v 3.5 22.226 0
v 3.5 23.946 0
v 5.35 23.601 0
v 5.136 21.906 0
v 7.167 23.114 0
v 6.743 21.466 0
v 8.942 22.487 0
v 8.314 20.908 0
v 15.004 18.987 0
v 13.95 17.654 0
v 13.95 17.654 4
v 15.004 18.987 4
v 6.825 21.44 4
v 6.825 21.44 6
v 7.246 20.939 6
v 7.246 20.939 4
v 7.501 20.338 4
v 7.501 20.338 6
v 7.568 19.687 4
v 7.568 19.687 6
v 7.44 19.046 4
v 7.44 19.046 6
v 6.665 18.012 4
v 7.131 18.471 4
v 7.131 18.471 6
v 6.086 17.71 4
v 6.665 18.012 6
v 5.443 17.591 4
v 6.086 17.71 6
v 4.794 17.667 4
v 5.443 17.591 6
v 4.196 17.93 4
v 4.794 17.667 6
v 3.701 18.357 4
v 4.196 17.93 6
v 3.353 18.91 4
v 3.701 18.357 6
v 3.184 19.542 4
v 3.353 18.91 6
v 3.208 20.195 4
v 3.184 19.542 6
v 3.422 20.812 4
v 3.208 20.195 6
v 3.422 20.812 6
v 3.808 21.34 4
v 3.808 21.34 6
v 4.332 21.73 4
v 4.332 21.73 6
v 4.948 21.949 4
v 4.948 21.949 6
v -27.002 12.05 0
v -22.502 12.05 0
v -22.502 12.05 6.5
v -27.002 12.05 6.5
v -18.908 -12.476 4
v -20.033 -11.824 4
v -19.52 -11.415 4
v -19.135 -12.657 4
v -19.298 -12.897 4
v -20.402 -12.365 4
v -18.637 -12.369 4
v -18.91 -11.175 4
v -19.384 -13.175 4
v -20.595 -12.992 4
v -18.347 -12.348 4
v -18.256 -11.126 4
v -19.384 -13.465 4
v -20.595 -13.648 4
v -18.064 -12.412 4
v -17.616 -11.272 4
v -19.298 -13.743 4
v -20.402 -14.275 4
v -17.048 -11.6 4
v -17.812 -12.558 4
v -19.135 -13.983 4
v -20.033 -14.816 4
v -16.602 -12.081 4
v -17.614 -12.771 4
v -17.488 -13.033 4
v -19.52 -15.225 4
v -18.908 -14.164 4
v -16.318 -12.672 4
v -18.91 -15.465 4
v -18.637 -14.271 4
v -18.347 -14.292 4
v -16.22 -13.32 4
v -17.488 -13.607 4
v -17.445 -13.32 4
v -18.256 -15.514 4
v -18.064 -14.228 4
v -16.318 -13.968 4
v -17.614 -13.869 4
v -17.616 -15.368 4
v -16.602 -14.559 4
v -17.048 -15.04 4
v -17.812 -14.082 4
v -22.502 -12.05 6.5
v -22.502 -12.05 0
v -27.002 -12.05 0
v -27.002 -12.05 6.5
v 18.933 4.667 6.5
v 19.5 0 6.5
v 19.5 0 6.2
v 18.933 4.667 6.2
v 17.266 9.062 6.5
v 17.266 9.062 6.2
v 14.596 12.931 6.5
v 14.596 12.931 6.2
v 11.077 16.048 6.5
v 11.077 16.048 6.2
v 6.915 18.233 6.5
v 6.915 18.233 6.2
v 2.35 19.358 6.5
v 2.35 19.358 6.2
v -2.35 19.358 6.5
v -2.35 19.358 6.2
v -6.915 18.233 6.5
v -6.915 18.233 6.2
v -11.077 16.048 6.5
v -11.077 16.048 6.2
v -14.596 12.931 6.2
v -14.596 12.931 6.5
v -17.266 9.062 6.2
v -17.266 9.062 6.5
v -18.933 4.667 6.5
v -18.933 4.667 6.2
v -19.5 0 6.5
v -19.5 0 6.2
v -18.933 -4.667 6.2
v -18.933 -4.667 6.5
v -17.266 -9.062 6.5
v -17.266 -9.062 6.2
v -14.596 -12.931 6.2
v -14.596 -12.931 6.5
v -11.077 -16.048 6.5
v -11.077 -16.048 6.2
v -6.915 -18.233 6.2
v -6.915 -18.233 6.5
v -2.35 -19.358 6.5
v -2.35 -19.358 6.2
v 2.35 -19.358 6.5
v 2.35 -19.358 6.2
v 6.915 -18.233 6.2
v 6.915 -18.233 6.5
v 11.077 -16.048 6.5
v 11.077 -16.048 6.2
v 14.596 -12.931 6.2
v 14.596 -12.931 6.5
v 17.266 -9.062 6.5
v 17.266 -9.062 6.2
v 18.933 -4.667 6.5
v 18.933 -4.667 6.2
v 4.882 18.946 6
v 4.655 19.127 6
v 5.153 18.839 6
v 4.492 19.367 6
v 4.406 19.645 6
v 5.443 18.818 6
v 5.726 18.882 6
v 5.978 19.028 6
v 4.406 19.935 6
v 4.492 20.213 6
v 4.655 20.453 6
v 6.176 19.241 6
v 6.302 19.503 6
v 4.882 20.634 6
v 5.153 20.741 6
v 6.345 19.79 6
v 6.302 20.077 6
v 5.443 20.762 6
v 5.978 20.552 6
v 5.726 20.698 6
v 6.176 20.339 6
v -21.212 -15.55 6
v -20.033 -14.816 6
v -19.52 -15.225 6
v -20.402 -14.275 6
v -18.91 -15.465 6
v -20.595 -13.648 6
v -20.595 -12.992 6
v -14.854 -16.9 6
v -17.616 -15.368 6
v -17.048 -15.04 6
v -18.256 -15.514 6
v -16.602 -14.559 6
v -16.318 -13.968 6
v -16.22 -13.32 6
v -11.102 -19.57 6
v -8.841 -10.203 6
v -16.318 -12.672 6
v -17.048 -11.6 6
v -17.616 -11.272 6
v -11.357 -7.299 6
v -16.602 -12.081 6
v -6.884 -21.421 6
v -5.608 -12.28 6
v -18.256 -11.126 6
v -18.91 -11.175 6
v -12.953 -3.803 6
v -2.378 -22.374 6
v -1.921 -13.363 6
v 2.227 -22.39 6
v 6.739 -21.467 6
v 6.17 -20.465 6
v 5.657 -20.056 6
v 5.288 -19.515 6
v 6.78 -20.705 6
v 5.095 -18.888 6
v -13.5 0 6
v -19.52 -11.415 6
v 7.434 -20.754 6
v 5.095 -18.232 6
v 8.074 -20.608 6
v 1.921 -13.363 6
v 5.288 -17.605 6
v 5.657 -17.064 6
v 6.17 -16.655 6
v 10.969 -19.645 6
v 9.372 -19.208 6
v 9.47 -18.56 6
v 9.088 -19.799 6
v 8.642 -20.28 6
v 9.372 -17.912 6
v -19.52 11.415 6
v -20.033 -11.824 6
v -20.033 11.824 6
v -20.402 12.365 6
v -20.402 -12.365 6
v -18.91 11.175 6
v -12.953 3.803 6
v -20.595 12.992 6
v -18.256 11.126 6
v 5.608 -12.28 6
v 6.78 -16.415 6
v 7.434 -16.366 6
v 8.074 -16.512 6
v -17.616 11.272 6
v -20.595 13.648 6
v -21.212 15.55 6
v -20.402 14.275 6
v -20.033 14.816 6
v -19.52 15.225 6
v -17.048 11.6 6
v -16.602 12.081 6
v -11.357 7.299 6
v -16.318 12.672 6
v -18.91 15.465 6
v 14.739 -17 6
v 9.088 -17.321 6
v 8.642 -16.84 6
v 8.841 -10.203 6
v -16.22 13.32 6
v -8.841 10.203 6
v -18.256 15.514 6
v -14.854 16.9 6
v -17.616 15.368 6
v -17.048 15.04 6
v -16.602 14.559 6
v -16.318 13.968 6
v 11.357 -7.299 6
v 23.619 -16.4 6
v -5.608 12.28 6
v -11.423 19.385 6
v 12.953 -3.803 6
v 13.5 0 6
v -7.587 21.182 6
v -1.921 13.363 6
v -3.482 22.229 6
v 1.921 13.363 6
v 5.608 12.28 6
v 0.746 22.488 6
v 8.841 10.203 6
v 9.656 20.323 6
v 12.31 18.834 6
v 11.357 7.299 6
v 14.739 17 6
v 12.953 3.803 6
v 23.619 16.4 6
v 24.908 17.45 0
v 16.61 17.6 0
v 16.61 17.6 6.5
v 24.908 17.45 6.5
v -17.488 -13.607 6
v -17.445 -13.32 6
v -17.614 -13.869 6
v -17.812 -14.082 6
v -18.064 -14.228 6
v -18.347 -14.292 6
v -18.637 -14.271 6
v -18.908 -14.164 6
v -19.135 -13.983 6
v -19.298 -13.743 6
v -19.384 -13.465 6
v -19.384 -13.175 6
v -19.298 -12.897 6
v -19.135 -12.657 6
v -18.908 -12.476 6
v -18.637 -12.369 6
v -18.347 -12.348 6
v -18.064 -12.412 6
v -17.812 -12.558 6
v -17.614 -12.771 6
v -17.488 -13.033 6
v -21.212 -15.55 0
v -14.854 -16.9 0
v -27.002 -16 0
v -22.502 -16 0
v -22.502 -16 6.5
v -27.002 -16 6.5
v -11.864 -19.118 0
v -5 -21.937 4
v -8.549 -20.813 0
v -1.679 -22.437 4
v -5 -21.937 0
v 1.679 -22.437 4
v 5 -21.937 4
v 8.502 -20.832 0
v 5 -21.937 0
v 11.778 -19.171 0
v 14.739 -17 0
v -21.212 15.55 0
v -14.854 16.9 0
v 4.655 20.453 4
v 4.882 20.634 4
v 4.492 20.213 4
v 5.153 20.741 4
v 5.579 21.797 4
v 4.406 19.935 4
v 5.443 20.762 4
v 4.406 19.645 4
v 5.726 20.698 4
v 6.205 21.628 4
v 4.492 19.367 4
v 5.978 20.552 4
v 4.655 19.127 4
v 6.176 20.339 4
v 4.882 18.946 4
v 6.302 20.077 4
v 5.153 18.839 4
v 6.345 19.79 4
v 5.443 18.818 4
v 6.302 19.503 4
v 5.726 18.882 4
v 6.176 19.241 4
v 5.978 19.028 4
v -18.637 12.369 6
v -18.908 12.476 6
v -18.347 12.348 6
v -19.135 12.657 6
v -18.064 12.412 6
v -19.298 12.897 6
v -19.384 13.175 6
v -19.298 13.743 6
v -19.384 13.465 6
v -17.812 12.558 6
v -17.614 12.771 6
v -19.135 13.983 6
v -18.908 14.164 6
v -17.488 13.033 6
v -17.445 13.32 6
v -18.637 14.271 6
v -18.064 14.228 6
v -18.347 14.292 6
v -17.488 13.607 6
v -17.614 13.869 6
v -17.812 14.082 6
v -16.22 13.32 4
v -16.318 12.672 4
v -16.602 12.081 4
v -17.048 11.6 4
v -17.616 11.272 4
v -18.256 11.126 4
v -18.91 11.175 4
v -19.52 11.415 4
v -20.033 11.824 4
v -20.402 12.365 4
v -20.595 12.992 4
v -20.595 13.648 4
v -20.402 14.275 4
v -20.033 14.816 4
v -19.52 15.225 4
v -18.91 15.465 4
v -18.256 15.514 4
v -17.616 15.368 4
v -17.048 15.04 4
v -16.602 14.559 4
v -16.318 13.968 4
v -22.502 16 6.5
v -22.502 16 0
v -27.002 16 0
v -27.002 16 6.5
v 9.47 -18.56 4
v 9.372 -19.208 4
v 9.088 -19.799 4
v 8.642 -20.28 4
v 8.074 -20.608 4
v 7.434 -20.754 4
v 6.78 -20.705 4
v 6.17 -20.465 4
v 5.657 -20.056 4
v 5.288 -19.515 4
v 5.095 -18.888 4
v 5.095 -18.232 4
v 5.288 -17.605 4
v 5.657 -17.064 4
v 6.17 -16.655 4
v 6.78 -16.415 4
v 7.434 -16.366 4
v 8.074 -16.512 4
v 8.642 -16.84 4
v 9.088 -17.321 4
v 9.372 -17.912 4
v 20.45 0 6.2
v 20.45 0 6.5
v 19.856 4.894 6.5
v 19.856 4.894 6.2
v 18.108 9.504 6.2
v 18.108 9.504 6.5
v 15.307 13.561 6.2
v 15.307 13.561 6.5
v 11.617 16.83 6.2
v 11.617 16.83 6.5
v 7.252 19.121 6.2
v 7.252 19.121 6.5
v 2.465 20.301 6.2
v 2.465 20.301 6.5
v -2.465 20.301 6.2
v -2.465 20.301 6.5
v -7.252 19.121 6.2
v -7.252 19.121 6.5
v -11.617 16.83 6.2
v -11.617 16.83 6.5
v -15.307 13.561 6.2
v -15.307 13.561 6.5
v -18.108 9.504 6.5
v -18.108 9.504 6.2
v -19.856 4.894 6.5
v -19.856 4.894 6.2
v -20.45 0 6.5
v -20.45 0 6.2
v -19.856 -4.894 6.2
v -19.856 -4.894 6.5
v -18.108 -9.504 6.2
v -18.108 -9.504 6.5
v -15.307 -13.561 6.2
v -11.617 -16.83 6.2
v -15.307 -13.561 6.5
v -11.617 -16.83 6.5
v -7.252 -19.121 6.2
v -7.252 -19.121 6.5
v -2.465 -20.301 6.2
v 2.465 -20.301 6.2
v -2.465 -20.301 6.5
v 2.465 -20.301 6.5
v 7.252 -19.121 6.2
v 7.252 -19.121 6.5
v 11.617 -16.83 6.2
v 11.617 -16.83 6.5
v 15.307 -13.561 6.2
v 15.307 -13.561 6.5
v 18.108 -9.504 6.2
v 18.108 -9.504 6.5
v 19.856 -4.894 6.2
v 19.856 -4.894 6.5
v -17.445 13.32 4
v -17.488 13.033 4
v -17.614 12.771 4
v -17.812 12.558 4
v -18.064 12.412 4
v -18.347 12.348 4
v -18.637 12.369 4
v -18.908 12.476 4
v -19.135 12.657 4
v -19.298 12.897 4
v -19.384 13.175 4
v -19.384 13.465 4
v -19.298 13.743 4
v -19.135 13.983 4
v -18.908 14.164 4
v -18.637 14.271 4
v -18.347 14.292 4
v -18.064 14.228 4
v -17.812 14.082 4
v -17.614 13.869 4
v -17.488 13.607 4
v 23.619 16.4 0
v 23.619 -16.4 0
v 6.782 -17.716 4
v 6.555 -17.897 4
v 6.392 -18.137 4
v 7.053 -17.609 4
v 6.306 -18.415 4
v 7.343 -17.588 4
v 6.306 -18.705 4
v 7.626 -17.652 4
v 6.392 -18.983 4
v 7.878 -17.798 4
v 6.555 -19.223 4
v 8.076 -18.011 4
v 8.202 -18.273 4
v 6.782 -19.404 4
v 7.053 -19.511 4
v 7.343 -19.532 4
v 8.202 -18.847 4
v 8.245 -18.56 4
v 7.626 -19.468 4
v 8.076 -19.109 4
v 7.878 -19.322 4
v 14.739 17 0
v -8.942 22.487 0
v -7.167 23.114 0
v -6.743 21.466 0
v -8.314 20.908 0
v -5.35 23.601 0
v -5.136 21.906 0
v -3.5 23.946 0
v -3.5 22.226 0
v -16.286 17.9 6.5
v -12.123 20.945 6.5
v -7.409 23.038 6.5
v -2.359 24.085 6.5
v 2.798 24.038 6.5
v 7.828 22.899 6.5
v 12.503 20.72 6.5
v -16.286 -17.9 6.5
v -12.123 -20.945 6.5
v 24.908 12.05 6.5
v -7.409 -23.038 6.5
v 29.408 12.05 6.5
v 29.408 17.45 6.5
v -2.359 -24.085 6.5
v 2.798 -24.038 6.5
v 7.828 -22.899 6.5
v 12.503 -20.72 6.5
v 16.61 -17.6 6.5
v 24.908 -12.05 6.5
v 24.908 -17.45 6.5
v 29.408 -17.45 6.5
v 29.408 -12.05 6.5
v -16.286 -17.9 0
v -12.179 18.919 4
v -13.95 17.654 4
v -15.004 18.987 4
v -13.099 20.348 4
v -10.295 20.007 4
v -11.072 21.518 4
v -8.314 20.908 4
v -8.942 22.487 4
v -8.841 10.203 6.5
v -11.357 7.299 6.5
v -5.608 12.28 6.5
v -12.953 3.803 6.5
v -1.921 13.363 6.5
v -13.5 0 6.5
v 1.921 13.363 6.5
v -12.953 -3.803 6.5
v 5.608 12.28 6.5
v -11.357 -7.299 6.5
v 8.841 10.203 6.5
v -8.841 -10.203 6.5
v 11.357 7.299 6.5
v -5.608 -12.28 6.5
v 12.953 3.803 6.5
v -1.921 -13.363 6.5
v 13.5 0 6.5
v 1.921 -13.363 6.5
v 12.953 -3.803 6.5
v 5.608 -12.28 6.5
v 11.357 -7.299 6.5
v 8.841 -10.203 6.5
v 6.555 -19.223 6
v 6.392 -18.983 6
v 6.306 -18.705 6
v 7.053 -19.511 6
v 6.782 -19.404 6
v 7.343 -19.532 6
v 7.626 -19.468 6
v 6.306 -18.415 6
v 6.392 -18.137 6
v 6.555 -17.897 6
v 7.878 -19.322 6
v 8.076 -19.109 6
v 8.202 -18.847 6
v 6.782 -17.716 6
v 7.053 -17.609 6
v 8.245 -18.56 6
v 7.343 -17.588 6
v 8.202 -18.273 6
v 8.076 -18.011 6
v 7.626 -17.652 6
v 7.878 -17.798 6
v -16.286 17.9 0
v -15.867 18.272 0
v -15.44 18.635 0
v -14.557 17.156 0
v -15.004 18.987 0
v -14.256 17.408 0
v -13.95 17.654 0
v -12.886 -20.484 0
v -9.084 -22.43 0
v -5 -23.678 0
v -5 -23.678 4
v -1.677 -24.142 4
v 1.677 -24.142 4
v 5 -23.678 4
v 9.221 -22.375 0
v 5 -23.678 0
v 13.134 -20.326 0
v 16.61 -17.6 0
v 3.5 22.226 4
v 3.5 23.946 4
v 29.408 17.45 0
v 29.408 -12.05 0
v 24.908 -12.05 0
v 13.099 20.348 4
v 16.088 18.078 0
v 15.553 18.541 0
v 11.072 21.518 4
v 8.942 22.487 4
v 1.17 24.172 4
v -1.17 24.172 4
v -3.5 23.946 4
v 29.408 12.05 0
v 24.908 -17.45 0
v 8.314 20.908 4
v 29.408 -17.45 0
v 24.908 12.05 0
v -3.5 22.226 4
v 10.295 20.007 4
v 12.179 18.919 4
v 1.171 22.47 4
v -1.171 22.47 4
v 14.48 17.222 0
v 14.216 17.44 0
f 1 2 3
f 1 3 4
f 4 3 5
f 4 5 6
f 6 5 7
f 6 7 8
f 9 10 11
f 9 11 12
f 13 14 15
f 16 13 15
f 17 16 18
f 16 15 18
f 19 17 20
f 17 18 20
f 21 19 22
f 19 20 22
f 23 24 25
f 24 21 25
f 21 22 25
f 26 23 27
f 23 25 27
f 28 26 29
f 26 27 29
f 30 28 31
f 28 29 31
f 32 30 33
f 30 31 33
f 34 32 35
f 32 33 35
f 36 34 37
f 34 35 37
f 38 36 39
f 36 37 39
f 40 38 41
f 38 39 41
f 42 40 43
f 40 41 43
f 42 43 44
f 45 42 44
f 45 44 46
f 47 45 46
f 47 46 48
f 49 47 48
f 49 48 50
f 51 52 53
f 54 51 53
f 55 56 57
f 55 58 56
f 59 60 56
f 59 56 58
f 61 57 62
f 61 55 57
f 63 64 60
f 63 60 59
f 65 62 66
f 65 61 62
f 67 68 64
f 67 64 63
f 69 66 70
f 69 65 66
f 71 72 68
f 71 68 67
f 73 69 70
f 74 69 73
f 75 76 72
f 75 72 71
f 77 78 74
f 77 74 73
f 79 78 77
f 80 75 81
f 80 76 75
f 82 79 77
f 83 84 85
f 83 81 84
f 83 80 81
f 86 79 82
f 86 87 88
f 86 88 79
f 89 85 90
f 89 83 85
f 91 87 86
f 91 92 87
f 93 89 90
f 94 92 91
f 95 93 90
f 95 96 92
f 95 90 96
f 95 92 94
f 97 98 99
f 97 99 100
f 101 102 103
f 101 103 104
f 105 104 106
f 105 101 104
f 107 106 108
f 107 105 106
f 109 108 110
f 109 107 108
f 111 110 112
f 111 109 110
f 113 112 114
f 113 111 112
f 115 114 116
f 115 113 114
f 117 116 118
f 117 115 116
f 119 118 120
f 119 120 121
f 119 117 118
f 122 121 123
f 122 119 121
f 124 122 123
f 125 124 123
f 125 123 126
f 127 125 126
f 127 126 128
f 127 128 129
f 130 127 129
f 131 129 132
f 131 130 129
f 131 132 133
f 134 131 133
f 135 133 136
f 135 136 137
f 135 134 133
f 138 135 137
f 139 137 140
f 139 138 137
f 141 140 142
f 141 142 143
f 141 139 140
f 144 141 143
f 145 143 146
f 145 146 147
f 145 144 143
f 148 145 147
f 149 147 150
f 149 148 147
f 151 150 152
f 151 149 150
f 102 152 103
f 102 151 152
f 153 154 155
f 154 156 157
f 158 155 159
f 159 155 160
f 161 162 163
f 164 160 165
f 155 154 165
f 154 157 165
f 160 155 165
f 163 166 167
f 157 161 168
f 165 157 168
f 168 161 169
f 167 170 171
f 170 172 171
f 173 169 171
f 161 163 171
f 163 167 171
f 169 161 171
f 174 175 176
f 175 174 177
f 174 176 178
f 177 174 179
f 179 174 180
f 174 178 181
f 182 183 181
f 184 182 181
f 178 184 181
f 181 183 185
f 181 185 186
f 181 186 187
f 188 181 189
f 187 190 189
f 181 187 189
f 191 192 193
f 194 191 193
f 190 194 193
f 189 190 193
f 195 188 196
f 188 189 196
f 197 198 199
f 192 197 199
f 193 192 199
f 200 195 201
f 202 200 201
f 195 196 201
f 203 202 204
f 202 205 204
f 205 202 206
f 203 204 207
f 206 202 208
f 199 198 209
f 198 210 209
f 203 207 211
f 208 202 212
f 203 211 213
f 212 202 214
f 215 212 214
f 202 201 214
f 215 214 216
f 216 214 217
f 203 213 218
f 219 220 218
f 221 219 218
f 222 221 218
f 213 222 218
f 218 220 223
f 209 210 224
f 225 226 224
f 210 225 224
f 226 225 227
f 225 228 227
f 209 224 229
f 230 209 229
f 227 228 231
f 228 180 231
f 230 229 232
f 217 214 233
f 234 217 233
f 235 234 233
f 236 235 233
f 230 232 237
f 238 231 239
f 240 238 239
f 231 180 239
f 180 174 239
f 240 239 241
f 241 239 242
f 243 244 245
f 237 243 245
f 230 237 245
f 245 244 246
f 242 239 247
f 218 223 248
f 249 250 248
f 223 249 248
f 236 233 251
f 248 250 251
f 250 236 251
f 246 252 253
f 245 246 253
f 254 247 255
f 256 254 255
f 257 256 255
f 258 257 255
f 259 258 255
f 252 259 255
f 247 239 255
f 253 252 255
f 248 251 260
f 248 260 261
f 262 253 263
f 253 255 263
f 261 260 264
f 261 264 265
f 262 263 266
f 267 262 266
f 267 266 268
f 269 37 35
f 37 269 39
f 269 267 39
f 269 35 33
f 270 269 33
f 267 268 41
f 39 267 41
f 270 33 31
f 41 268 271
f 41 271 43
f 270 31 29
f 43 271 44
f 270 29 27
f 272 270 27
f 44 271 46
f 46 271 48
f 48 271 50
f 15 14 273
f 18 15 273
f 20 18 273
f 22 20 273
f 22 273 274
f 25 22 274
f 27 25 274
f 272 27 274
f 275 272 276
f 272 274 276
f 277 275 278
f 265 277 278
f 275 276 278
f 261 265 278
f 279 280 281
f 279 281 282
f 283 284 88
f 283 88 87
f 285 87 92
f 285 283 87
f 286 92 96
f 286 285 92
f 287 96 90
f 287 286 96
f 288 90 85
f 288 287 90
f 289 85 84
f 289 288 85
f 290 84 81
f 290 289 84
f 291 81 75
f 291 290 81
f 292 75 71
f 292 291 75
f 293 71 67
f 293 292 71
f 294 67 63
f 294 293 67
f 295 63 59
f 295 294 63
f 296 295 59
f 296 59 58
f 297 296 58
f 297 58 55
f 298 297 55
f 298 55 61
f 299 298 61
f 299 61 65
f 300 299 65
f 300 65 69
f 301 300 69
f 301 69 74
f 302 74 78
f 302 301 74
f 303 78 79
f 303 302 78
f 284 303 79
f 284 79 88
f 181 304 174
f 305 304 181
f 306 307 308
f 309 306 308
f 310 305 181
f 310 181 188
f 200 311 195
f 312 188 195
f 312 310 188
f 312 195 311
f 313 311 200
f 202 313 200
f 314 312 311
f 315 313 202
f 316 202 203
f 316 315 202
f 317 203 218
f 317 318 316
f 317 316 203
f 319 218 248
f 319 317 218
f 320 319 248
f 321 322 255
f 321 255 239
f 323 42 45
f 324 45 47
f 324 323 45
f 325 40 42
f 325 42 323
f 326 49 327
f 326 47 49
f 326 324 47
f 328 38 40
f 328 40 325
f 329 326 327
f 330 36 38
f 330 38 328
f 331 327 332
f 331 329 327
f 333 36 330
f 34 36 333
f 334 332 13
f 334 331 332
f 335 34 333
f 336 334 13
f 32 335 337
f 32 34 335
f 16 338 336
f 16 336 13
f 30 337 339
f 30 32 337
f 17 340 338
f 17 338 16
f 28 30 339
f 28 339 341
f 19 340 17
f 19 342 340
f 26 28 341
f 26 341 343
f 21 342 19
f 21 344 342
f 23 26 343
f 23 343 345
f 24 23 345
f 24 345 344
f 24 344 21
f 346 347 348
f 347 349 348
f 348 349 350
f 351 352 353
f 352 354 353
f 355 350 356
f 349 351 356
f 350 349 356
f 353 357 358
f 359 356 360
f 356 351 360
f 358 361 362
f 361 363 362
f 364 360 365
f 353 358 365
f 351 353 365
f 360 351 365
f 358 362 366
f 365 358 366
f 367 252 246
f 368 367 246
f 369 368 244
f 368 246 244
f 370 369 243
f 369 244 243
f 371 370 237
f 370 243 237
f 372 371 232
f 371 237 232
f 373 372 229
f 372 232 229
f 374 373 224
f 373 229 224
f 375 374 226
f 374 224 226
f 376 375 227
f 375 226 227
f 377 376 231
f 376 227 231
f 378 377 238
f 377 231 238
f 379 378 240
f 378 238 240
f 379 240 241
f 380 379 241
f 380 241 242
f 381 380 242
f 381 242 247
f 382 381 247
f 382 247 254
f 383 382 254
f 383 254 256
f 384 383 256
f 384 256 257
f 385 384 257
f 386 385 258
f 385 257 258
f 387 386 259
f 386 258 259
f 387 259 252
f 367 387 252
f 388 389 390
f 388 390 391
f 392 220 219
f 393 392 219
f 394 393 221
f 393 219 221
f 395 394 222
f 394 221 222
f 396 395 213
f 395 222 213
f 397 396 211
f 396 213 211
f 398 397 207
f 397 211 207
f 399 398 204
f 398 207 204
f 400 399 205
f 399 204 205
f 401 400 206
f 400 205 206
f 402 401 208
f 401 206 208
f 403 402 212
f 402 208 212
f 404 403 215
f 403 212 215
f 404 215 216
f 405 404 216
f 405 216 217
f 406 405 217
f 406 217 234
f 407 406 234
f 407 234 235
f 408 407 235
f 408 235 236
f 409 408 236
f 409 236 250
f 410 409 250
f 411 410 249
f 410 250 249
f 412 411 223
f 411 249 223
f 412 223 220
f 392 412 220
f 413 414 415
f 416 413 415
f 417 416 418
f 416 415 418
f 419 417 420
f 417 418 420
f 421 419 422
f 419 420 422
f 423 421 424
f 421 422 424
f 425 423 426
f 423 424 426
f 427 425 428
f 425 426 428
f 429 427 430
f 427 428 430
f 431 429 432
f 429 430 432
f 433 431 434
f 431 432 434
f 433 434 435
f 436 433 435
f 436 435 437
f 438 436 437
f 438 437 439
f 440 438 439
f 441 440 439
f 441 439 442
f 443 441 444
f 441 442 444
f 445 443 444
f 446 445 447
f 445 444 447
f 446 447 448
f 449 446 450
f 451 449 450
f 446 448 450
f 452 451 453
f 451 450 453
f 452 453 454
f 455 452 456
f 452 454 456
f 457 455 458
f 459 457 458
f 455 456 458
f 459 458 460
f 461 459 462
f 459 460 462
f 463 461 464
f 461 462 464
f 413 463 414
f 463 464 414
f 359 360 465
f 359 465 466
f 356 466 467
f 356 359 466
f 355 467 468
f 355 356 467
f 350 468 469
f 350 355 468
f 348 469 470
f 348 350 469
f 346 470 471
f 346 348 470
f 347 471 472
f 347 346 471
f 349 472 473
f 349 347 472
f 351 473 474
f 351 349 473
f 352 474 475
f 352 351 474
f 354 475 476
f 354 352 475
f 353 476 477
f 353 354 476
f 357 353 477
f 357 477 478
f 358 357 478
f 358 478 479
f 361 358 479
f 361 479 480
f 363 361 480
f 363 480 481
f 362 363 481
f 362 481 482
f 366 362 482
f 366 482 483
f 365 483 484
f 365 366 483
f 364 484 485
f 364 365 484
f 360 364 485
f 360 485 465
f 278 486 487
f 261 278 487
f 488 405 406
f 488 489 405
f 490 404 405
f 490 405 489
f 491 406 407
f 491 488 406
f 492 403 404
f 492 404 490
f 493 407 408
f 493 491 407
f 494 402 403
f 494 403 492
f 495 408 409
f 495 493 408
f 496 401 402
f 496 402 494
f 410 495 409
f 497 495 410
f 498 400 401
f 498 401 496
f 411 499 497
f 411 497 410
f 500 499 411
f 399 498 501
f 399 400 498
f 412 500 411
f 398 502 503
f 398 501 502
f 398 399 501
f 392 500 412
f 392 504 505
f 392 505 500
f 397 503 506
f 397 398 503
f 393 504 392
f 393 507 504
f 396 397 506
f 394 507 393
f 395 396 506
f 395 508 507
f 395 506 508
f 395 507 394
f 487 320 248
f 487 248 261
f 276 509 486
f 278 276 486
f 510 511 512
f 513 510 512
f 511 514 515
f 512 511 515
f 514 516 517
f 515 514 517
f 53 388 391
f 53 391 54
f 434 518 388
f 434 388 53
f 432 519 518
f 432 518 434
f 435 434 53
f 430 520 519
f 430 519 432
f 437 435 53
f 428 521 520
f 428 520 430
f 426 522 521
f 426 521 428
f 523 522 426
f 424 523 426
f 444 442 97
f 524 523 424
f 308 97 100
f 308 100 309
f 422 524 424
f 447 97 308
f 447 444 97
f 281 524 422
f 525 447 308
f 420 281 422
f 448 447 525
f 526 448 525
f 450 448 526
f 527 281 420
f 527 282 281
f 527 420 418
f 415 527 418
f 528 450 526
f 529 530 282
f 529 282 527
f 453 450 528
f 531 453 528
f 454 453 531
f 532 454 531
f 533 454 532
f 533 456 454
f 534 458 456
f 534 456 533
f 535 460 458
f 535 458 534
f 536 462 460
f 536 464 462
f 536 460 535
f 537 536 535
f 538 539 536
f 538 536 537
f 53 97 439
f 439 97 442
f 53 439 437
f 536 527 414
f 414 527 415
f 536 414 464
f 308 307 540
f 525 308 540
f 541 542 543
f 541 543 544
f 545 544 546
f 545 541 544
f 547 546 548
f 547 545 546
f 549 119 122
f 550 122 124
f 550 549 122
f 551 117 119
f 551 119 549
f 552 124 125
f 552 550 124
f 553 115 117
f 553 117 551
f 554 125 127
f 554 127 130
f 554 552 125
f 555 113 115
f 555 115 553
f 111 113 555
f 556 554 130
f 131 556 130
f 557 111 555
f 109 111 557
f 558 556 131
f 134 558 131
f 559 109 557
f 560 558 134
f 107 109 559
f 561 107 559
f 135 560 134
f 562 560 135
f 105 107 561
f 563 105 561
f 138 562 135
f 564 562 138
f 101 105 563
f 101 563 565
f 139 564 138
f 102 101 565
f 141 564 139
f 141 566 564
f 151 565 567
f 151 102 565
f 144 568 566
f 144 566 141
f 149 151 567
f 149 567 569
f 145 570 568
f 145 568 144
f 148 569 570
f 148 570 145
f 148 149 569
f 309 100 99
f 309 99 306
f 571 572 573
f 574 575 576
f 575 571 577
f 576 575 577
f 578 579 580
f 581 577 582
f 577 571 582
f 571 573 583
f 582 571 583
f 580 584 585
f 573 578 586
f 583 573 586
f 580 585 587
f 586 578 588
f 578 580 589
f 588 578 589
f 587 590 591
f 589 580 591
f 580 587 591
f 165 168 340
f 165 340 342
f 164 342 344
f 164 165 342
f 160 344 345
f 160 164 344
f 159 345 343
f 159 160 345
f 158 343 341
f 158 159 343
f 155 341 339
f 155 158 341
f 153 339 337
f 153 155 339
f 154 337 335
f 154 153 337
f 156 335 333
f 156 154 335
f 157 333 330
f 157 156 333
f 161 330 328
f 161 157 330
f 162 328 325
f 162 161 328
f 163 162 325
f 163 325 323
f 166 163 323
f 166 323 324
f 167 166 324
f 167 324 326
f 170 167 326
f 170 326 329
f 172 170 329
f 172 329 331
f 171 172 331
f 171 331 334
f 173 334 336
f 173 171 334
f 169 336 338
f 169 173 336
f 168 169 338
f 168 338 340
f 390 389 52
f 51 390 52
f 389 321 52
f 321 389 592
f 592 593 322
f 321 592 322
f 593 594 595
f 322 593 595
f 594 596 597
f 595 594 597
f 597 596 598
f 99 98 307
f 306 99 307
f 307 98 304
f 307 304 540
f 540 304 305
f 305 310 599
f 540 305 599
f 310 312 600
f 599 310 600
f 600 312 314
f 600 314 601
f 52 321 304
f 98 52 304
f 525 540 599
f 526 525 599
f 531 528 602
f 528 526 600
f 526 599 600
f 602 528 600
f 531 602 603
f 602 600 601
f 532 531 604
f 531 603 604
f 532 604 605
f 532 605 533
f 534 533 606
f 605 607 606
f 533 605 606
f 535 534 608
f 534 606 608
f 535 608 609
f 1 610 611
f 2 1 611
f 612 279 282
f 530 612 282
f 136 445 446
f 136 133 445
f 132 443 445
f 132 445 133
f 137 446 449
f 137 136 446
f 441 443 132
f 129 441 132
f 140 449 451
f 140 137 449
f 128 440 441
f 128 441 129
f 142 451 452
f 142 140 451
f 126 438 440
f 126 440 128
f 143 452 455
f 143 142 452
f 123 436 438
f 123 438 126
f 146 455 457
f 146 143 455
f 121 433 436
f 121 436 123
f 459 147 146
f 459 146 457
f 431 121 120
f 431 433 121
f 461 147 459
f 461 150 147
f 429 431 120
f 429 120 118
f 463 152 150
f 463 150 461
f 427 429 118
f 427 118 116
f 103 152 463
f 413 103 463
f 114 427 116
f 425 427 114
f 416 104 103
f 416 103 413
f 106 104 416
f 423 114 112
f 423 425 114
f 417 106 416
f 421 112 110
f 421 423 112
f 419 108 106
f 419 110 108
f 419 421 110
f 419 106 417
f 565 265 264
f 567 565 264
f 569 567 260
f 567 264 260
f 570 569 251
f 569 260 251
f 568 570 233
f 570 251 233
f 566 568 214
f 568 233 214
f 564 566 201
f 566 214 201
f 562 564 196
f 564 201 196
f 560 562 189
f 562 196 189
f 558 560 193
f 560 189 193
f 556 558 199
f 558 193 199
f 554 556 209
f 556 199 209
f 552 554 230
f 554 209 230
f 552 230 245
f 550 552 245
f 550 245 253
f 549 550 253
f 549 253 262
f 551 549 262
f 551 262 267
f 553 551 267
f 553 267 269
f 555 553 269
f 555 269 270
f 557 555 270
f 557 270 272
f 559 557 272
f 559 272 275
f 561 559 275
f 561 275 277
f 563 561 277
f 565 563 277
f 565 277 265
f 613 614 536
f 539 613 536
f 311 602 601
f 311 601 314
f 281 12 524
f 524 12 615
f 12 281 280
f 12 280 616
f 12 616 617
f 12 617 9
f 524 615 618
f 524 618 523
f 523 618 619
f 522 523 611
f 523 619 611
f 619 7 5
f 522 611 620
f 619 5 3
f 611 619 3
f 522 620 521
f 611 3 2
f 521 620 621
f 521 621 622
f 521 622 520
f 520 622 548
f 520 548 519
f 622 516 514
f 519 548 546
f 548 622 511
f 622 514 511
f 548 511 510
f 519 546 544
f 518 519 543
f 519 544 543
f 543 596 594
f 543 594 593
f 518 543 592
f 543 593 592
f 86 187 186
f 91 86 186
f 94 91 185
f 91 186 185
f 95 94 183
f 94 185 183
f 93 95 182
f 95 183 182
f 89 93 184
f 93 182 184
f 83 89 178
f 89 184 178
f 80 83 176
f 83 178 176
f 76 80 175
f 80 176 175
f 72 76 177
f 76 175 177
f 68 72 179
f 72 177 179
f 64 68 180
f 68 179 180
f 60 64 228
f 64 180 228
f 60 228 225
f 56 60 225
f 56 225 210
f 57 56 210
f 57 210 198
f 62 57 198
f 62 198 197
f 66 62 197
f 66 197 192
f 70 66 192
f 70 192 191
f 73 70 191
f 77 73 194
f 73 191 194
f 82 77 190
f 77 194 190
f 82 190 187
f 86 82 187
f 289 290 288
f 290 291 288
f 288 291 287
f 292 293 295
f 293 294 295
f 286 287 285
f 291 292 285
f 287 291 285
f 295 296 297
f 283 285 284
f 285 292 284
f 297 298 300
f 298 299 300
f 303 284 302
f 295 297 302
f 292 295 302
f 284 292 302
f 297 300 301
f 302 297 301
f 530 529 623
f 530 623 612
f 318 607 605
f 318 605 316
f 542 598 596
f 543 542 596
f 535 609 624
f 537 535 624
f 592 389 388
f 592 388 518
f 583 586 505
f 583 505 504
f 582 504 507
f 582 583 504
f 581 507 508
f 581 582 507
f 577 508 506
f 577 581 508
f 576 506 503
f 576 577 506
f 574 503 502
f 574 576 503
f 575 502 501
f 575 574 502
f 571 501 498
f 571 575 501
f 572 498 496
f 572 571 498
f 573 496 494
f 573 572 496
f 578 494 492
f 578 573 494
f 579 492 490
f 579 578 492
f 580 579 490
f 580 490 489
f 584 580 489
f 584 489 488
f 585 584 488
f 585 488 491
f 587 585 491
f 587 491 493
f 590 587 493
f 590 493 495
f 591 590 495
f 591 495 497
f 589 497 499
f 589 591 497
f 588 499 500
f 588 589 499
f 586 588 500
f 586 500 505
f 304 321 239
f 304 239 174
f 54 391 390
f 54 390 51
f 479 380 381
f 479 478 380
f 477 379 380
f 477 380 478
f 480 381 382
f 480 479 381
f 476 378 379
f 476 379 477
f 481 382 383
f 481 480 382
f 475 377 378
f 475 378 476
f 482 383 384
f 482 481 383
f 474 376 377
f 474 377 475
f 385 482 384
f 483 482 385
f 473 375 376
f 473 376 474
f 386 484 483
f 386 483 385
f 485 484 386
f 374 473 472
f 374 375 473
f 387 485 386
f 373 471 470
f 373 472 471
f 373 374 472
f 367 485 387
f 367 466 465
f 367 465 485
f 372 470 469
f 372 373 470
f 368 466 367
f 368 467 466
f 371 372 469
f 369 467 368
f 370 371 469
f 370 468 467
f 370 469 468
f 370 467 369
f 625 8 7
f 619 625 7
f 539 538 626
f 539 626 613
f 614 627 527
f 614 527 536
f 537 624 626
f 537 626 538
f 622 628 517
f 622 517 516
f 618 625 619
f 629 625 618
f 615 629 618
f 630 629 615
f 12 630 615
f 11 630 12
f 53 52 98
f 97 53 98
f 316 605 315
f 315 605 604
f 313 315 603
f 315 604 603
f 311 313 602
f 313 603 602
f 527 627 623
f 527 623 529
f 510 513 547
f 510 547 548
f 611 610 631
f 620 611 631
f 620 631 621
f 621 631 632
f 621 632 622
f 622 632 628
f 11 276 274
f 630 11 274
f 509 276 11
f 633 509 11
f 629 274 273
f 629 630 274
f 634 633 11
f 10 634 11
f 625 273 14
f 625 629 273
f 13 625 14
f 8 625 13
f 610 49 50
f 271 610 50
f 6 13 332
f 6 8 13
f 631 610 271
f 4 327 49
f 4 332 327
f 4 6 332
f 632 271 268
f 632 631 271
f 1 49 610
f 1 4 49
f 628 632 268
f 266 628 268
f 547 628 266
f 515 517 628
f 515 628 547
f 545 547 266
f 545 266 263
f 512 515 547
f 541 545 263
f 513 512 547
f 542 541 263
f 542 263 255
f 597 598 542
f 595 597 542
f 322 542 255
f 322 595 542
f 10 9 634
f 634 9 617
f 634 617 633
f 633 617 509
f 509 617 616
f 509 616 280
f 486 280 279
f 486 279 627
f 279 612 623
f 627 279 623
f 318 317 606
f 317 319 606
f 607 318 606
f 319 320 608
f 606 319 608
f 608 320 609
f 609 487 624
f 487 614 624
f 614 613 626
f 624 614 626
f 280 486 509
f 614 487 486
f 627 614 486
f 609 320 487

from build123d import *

# Parameters (mm, degrees)
PAD_DEPTH       = 6.5
POCKET_DEPTH    = 6
SKETCH002_R     = 13.5
POCKET001_DEPTH = 1
SKETCH003_W     = 5.4
SKETCH003_H     = 6.5
PAD001_DEPTH    = 4.5
SKETCH010_W     = 3.95
SKETCH010_H     = 6.5
PAD002_DEPTH    = 4.5
SKETCH014_R     = 20.45
SKETCH014_R_2   = 19.5
POCKET008_DEPTH = 0.3
SKETCH015_R     = 2.2
SKETCH015_R_2   = 0.975
PAD003_DEPTH    = 2
POCKET009_DEPTH = 4
POCKET010_DEPTH = 4


with BuildPart() as part:
    # Sketch → Pad (new body)
    with BuildSketch(Plane.XY):
        with BuildLine():
            Line((-22.5019915649, 16), (-22.5019915649, -16))
            Line((-22.5019915649, -16), (-16.2858834577, -17.9000000001))
            ThreePointArc((-16.2858834577, -17.9000000001), (0.2206895737, -24.1989937004), (16.6096357576, -17.5999999999))
            Line((16.6096357576, -17.5999999999), (24.9082802252, -17.45))
            Line((24.9082802252, 17.45), (24.9082802252, -17.45))
            Line((16.6096357576, 17.6), (24.9082802252, 17.45))
            ThreePointArc((16.6096357576, 17.6), (0.2206895736, 24.1989937004), (-16.2858834578, 17.9))
            Line((-22.5019915649, 16), (-16.2858834578, 17.9))
        make_face()
    extrude(amount=PAD_DEPTH)

    # Sketch001 → Pocket (cut)
    with BuildSketch(Plane.XY):
        with BuildLine():
            Line((-14.8539557021, 16.9), (-21.2122180433, 15.55))
            Line((-21.2122180433, 15.55), (-21.2122180433, -15.55))
            Line((-21.2122180433, -15.55), (-14.8539557021, -16.9))
            ThreePointArc((-14.8539557021, -16.9), (-0.0760301383, -22.4998715423), (14.739402973, -17))
            Line((14.739402973, -17), (23.6191552218, -16.4))
            Line((23.6191552218, 16.4), (23.6191552218, -16.4))
            Line((14.739402973, 17), (23.6191552218, 16.4))
            ThreePointArc((14.739402973, 17), (-0.0760301383, 22.4998715423), (-14.8539557021, 16.9))
        make_face()
    extrude(amount=POCKET_DEPTH, mode=Mode.SUBTRACT)

    # Sketch002 (on Face19 of Pocket) → Pocket001 (cut)
    with BuildSketch(Plane(origin=(0, 0, 6), x_dir=(1, 0, 0), z_dir=(0, 0, -1))):
        Circle(SKETCH002_R)
    extrude(amount=-POCKET001_DEPTH, mode=Mode.SUBTRACT)

    # Sketch003 (on Face7 of Pad) → Pad001 (join)
    with BuildSketch(Plane.YZ.offset(24.9082802252)):
        with Locations((-14.75, 3.25)):
            Rectangle(SKETCH003_W, SKETCH003_H)
        with Locations((14.75, 3.25)):
            Rectangle(SKETCH003_W, SKETCH003_H)
    extrude(amount=PAD001_DEPTH)

    # Sketch010 (on Face3 of Pad) → Pad002 (join)
    with BuildSketch(Plane(origin=(-22.5019915649, 0, 0), x_dir=(0, -1, 0), z_dir=(-1, 0, 0))):
        with Locations((-14.025, 3.25)):
            Rectangle(SKETCH010_W, SKETCH010_H)
        with Locations((14.025, 3.25)):
            Rectangle(SKETCH010_W, SKETCH010_H)
    extrude(amount=PAD002_DEPTH)

    # Sketch014 (on Face10 of Pad) → Pocket008 (cut)
    with BuildSketch(Plane.XY.offset(6.5)):
        Circle(SKETCH014_R)
        Circle(SKETCH014_R_2, mode=Mode.SUBTRACT)
    extrude(amount=-POCKET008_DEPTH, mode=Mode.SUBTRACT)

    # Sketch015 (on Face19 of Pocket) → Pad003 (join)
    with BuildSketch(Plane(origin=(0, 0, 6), x_dir=(1, 0, 0), z_dir=(0, 0, -1))):
        with Locations((-18.42, 13.32)):
            Circle(SKETCH015_R)
        with Locations((-18.42, 13.32)):
            Circle(SKETCH015_R_2, mode=Mode.SUBTRACT)
        with Locations((7.27, 18.56)):
            Circle(SKETCH015_R)
        with Locations((7.27, 18.56)):
            Circle(SKETCH015_R_2, mode=Mode.SUBTRACT)
        with Locations((5.37, -19.79)):
            Circle(SKETCH015_R)
        with Locations((5.37, -19.79)):
            Circle(SKETCH015_R_2, mode=Mode.SUBTRACT)
        with Locations((-18.42, -13.32)):
            Circle(SKETCH015_R)
        with Locations((-18.42, -13.32)):
            Circle(SKETCH015_R_2, mode=Mode.SUBTRACT)
    extrude(amount=PAD003_DEPTH)

    # Sketch016 → Pocket009 (cut)
    with BuildSketch(Plane(origin=(0, 0, 0), x_dir=(-1, 0, 0), z_dir=(0, 0, 1))):
        with BuildLine():
            Line((-5, 23.6778377391), (-5, 21.9374109685))
            ThreePointArc((5, 21.9374109685), (0, 22.5), (-5, 21.9374109685))
            Line((5, 23.6778377391), (5, 21.9374109685))
            ThreePointArc((5, 23.6778377391), (0, 24.2), (-5, 23.6778377391))
        make_face()
    extrude(amount=POCKET009_DEPTH, mode=Mode.SUBTRACT)

    # Sketch017 → Pocket010 (cut)
    with BuildSketch(Plane(origin=(0, 0, 0), x_dir=(-1, 0, 0), z_dir=(0, 0, 1))):
        with BuildLine():
            Line((-3.499984119, -22.2261132717), (-3.5, -23.9455632634))
            ThreePointArc((-3.5, -23.9455632634), (0, -24.2000019575), (3.5, -23.9455632634))
            Line((3.5000158811, -22.2261082701), (3.5, -23.9455632634))
            ThreePointArc((-3.499984119, -22.2261132717), (1.60767e-05, -22.5), (3.5000158811, -22.2261082701))
        make_face()
        with BuildLine():
            ThreePointArc((-13.9498796389, -17.6536358312), (-11.25, -19.4855715851), (-8.3135572795, -20.9077680626))
            Line((-8.3135572795, -20.9077680626), (-8.9416927184, -22.487466094))
            ThreePointArc((-15.0038705449, -18.987466094), (-12.1, -20.9578147716), (-8.9416927184, -22.487466094))
            Line((-13.9498796389, -17.6536358312), (-15.0038705449, -18.987466094))
        make_face()
        with BuildLine():
            ThreePointArc((8.3135572795, -20.9077680626), (11.25, -19.4855715851), (13.9498796389, -17.6536358312))
            Line((13.9498796389, -17.6536358312), (15.0038705449, -18.987466094))
            ThreePointArc((8.9416927184, -22.487466094), (12.1, -20.9578147716), (15.0038705449, -18.987466094))
            Line((8.3135572795, -20.9077680626), (8.9416927184, -22.487466094))
        make_face()
    extrude(amount=POCKET010_DEPTH, mode=Mode.SUBTRACT)


solid = part.part
